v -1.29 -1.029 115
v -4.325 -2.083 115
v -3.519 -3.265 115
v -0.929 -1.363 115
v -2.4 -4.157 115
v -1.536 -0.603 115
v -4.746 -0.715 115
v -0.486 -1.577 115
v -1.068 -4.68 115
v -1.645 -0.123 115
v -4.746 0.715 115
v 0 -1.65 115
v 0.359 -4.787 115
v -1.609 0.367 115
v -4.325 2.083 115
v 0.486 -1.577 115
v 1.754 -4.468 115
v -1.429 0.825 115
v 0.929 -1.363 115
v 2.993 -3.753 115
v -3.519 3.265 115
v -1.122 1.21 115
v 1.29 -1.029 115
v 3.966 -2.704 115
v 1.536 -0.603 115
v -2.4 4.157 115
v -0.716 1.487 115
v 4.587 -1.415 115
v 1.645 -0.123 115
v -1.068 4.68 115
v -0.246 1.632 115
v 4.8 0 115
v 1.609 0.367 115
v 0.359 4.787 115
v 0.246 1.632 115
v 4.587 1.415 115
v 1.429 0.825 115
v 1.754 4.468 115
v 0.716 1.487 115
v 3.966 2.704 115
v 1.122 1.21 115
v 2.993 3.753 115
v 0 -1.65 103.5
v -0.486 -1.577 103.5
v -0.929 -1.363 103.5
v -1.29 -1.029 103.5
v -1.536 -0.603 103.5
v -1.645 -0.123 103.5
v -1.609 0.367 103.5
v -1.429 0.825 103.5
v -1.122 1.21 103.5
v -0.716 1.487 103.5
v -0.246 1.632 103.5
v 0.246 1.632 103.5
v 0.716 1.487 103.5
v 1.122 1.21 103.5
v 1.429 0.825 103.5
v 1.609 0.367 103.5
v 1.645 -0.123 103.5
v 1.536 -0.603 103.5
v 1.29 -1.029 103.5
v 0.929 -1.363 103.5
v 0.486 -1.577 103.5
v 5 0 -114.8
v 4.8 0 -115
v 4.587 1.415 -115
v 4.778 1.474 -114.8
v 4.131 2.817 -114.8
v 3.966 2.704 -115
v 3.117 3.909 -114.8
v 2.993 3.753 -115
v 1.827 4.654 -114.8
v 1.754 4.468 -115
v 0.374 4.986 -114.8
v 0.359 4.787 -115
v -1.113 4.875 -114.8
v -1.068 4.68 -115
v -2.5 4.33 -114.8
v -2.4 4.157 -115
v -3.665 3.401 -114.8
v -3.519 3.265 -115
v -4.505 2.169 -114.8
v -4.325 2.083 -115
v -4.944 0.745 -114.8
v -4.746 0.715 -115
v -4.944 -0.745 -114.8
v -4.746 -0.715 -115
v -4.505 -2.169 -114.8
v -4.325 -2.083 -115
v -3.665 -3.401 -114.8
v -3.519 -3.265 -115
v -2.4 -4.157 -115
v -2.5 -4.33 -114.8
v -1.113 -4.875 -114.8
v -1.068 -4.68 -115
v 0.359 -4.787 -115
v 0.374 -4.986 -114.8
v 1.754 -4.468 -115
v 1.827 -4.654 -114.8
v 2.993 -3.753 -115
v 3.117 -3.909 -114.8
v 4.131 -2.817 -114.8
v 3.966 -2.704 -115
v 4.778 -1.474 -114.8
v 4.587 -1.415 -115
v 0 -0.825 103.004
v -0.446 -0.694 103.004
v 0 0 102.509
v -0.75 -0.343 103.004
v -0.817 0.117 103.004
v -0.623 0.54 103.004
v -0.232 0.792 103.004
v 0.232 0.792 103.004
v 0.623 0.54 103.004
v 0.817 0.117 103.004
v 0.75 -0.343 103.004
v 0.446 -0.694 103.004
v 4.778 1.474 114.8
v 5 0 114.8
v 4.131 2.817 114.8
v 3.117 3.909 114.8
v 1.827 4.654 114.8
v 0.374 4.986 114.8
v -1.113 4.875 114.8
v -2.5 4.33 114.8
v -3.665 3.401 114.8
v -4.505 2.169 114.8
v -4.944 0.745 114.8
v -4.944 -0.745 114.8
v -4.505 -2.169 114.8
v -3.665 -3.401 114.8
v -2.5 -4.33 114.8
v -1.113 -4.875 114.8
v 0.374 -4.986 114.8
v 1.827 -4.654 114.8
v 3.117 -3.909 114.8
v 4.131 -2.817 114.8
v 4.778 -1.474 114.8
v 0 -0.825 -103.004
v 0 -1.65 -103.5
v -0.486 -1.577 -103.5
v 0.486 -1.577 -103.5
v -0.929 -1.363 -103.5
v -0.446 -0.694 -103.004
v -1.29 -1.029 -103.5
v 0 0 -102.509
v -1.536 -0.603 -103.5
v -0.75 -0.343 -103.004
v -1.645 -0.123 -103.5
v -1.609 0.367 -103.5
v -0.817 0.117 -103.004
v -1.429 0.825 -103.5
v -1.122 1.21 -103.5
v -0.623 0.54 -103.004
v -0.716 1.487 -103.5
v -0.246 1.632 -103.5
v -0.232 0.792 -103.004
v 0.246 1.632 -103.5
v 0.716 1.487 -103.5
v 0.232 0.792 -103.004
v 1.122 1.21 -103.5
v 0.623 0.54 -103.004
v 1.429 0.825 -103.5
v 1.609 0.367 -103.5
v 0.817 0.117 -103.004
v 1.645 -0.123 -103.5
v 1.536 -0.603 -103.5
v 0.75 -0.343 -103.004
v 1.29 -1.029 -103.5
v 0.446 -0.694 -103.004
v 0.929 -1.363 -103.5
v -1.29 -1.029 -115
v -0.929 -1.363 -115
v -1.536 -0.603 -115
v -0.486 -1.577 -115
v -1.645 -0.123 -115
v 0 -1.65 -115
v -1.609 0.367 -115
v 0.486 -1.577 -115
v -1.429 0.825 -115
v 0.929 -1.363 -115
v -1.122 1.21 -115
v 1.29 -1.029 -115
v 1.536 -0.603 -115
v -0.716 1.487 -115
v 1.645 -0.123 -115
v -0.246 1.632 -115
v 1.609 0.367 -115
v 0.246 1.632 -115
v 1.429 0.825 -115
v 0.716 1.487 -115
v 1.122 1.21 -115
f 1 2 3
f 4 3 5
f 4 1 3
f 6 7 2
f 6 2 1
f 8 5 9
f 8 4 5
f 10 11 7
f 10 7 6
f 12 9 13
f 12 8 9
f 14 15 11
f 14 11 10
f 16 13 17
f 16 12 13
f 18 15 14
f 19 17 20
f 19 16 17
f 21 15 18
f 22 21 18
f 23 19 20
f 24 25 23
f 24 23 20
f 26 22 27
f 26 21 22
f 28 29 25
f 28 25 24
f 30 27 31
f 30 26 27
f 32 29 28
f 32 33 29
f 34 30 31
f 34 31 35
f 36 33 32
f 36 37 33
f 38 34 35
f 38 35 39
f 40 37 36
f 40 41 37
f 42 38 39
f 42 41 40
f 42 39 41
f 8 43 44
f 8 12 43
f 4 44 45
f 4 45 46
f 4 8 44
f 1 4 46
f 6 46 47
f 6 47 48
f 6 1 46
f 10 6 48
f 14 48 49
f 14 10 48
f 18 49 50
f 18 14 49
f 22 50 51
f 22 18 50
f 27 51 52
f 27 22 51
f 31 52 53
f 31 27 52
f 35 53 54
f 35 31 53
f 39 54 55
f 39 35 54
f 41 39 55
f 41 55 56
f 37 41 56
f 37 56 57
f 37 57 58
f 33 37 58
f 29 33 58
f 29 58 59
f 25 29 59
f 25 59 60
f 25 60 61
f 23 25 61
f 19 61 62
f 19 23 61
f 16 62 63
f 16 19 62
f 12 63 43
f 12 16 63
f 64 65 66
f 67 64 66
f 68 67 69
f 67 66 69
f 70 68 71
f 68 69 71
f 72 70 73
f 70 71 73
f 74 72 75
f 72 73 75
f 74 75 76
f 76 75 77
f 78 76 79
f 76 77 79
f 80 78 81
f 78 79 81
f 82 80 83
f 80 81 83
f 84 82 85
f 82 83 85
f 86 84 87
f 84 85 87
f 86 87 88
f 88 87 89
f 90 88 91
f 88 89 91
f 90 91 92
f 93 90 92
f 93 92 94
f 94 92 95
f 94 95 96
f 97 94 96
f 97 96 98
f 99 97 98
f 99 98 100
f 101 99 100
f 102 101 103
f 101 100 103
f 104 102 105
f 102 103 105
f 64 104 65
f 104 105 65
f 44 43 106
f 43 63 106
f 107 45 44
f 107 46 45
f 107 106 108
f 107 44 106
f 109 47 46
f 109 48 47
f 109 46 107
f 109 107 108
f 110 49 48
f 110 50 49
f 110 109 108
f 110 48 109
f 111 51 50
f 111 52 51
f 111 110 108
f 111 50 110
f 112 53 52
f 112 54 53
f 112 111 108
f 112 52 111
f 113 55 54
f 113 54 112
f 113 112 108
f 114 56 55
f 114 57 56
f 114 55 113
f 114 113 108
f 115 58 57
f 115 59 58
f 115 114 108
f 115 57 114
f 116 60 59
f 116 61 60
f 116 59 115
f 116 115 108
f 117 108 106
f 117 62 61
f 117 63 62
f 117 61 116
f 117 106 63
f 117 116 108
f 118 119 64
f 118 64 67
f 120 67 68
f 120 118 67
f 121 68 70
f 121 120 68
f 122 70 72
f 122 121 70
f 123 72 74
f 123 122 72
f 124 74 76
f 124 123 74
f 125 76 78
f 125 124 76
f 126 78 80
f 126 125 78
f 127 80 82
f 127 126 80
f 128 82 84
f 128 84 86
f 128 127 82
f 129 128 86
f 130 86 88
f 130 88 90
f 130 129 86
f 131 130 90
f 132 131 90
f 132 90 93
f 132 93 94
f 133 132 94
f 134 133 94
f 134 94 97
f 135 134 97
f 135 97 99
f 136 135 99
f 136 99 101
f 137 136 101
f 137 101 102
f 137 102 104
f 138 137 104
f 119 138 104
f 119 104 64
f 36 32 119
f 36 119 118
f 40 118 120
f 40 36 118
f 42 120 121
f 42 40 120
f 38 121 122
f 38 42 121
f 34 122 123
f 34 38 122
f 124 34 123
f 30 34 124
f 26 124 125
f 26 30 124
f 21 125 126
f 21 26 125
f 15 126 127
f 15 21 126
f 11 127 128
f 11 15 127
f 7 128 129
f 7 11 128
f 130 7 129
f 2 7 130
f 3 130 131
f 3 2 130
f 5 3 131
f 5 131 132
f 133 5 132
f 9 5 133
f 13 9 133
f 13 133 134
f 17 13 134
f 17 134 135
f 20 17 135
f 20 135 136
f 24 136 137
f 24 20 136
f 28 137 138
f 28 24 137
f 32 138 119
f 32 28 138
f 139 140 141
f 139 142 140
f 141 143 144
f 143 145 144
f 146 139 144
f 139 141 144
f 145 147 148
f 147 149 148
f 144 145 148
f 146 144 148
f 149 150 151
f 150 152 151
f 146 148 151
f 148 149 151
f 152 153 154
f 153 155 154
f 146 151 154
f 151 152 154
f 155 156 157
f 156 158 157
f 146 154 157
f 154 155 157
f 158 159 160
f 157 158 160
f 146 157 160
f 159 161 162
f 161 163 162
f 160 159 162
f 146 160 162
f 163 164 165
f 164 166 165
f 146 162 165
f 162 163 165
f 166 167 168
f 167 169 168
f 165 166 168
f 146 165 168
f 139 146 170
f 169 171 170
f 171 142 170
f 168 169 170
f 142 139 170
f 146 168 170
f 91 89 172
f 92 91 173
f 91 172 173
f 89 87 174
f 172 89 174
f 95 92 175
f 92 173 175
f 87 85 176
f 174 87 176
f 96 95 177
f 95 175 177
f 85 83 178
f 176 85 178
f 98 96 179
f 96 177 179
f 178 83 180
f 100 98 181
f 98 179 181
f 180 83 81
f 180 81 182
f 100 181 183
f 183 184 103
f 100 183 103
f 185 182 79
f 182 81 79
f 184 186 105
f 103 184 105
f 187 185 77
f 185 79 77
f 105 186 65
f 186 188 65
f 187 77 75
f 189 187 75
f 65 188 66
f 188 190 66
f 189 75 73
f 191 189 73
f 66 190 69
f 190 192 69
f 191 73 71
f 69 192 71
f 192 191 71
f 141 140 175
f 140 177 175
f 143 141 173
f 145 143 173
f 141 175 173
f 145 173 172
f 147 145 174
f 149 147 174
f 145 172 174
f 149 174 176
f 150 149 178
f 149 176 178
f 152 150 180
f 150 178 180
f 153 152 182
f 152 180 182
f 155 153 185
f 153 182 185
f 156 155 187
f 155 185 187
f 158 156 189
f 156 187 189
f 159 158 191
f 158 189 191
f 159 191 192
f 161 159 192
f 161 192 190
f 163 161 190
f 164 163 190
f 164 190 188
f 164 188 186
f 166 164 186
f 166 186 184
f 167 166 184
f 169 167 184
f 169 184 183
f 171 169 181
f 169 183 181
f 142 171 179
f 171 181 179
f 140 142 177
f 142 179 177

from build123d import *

# Parameters (mm, degrees)
SKETCH_1_R      = 5
EXTRUDE_1_DEPTH = 115
CHAMFER_1_SIZE  = 0.2


with BuildPart() as part:
    # ｽｹｯﾁ1 → ﾎﾞｽ - 押し出し1 (new, symmetric)
    with BuildSketch(Plane.XY):
        Circle(SKETCH_1_R)
    extrude(amount=EXTRUDE_1_DEPTH, both=True)

    # ｽｹｯﾁ3 → M4x0.7 ねじ穴1 (revolve, cut)
    with BuildSketch(Plane(origin=(0, 0, 115), x_dir=(0, -1, 0), z_dir=(1, 0, 0))):
        Polygon((0, 0), (0, 12.491420021), (1.65, 11.5), (1.65, 0), align=None)
    m4x0_7_1 = revolve(axis=Axis((0, 0, 121.35), (0, 0, -1)), mode=Mode.SUBTRACT)

    # ﾐﾗｰ1: M4x0.7 ねじ穴1 across plane
    add(m4x0_7_1.mirror(Plane.XY), mode=Mode.SUBTRACT)

    # 面取り1
    chamfer_1_edges = [part.edges().sort_by_distance(p)[0] for p in [
        (-5, 0, -115),
        (-5, 0, 115),
    ]]
    chamfer(chamfer_1_edges, length=CHAMFER_1_SIZE)


solid = part.part
